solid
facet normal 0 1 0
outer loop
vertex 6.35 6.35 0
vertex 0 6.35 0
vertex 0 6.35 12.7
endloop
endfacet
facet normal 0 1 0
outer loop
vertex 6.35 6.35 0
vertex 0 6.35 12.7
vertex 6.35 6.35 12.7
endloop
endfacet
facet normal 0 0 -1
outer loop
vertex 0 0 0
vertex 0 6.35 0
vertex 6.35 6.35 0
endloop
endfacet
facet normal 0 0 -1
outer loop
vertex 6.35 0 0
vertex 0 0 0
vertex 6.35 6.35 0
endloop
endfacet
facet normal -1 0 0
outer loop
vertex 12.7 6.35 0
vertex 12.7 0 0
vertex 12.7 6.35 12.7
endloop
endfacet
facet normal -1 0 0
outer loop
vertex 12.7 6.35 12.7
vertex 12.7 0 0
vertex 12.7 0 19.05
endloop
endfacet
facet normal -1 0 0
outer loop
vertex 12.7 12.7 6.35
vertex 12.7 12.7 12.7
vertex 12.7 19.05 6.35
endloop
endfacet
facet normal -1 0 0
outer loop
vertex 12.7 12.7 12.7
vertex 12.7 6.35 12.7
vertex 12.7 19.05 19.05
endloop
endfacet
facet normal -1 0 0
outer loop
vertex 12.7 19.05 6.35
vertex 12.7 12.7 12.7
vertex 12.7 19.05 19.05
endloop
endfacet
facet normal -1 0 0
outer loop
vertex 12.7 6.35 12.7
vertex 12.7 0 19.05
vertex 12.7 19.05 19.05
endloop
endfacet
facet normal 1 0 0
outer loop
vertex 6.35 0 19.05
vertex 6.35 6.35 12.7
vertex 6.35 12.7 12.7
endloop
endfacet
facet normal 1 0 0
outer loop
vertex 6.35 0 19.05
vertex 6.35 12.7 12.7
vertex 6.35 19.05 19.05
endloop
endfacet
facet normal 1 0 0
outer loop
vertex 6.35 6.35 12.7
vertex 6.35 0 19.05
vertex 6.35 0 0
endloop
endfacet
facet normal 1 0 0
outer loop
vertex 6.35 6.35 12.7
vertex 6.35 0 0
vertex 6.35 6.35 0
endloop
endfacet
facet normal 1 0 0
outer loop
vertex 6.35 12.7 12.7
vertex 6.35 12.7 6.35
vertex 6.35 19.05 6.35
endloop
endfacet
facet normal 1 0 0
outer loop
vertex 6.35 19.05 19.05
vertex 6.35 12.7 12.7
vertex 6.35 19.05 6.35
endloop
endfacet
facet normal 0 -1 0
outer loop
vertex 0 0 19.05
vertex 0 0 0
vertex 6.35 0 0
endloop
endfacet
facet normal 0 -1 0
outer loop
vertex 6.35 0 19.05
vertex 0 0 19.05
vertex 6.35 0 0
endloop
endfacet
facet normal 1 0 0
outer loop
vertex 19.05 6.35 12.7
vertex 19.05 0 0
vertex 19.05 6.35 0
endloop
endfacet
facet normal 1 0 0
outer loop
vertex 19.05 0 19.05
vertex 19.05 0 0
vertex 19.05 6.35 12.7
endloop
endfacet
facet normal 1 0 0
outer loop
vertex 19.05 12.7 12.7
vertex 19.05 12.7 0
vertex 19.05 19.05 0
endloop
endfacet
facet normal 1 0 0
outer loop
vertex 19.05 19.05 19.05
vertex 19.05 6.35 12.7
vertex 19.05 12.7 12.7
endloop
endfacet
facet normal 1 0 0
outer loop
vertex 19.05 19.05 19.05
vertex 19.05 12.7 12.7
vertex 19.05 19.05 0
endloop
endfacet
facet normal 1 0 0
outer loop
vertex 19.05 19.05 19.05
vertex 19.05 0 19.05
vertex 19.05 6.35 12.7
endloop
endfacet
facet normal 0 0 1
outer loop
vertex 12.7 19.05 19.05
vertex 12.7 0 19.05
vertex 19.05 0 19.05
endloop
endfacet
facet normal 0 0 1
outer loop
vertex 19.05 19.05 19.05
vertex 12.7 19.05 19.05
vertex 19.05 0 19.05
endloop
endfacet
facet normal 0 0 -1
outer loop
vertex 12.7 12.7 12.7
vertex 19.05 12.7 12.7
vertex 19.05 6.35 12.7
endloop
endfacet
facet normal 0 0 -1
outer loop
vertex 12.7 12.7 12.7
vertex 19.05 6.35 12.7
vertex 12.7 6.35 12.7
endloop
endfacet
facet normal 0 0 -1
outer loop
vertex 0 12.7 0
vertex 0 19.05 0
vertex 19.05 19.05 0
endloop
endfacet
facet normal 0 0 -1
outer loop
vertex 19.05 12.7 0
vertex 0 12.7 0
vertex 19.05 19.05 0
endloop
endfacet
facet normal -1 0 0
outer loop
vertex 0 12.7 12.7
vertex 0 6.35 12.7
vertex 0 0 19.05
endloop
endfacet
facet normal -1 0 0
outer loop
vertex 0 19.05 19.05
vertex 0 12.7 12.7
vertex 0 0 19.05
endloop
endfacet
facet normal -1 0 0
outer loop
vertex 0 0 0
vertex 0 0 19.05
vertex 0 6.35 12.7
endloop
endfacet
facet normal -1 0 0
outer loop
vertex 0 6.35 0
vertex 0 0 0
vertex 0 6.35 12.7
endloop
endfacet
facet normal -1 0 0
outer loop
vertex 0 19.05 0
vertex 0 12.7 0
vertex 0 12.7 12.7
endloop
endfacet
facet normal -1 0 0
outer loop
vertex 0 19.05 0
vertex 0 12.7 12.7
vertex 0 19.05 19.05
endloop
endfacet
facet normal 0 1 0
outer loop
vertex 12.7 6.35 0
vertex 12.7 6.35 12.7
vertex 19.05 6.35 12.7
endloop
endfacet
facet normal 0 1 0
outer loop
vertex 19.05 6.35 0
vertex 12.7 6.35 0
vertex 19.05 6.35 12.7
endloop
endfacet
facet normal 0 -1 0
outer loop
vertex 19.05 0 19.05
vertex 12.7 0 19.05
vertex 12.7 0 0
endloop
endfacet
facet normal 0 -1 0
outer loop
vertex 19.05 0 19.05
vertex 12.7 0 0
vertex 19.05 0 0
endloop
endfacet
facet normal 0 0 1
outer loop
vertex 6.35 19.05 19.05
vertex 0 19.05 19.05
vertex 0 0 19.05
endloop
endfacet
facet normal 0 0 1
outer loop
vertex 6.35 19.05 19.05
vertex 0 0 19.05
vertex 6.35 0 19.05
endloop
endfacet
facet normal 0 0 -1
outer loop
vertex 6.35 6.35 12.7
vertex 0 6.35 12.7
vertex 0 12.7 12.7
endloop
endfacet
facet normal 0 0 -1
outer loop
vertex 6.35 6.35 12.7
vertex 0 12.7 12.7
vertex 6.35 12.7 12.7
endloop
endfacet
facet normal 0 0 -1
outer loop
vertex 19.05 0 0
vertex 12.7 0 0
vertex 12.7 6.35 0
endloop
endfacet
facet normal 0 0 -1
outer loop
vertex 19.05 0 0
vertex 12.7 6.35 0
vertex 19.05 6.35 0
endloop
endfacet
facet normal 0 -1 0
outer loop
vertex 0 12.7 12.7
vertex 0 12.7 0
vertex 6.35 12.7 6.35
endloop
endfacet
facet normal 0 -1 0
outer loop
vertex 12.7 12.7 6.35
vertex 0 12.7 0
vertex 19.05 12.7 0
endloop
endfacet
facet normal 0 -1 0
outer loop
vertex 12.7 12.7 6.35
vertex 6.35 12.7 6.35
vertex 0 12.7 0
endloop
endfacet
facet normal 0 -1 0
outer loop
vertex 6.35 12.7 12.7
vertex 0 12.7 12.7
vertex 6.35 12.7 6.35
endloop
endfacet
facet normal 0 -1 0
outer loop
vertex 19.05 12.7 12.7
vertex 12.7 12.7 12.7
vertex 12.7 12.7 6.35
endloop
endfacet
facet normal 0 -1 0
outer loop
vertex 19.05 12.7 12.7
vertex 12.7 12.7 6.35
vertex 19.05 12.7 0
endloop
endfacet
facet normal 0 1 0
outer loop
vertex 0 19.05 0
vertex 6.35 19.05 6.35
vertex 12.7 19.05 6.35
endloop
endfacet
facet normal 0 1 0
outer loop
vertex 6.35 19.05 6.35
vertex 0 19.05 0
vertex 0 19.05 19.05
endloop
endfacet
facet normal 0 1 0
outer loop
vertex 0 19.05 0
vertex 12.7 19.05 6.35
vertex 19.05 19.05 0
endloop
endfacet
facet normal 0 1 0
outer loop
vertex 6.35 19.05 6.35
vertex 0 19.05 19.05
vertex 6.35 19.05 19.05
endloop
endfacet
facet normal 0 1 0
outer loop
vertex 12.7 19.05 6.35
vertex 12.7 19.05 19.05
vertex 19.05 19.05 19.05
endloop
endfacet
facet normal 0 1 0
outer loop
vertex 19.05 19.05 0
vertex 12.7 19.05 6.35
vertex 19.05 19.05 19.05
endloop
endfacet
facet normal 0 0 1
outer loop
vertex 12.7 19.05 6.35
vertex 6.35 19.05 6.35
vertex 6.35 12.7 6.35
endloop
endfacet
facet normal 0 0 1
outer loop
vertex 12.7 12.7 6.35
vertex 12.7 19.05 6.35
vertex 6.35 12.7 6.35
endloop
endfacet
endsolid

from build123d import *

# Parameters (mm, degrees)
F0_W      = 6.35
F0_H      = 6.35
F1_DEPTH  = 19.05
F2_W      = 6.35
F2_H      = 6.35
F3_DEPTH  = 19.05
F4_W      = 6.35
F4_H      = 6.35
F5_DEPTH  = 19.05
F6_W      = 6.35
F6_H      = 6.35
F7_DEPTH  = 19.05
F8_W      = 6.35
F8_H      = 6.35
F9_DEPTH  = 19.05
F10_W     = 6.35
F10_H     = 6.35
F11_DEPTH = 19.05
F12_W     = 6.35
F12_H     = 6.35
F13_DEPTH = 19.05


with BuildPart() as f1:
    # F0 (on Top) → F1 (new body)
    with BuildSketch(Plane.XY):
        with Locations((3.175, 3.175)):
            Rectangle(F0_W, F0_H)
    extrude(amount=F1_DEPTH)

    # F2 (on face) → F3 (join)
    with BuildSketch(Plane.XZ):
        with Locations((3.175, 15.875)):
            Rectangle(F2_W, F2_H)
    extrude(amount=-F3_DEPTH)

    # F4 (on face) → F5 (join)
    with BuildSketch(Plane.XY.offset(19.05)):
        with Locations((3.175, 15.875)):
            Rectangle(F4_W, F4_H)
    extrude(amount=-F5_DEPTH)

    # F6 (on face) → F7 (join)
    with BuildSketch(Plane(origin=(0, 0, 0), x_dir=(0, -1, 0), z_dir=(-1, 0, 0))):
        with Locations((-15.875, 3.175)):
            Rectangle(F6_W, F6_H)
    extrude(amount=-F7_DEPTH)

    # F8 (on face) → F9 (join)
    with BuildSketch(Plane(origin=(0, 0, 0), x_dir=(1, 0, 0), z_dir=(0, 0, -1))):
        with Locations((15.875, -15.875)):
            Rectangle(F8_W, F8_H)
    extrude(amount=-F9_DEPTH)

    # F10 (on face) → F11 (join)
    with BuildSketch(Plane(origin=(0, 19.05, 0), x_dir=(-1, 0, 0), z_dir=(0, 1, 0))):
        with Locations((-15.875, 15.875)):
            Rectangle(F10_W, F10_H)
    extrude(amount=-F11_DEPTH)

    # F12 (on face) → F13 (join)
    with BuildSketch(Plane.XY.offset(19.05)):
        with Locations((15.875, 3.175)):
            Rectangle(F12_W, F12_H)
    extrude(amount=-F13_DEPTH)


solid = f1.part
